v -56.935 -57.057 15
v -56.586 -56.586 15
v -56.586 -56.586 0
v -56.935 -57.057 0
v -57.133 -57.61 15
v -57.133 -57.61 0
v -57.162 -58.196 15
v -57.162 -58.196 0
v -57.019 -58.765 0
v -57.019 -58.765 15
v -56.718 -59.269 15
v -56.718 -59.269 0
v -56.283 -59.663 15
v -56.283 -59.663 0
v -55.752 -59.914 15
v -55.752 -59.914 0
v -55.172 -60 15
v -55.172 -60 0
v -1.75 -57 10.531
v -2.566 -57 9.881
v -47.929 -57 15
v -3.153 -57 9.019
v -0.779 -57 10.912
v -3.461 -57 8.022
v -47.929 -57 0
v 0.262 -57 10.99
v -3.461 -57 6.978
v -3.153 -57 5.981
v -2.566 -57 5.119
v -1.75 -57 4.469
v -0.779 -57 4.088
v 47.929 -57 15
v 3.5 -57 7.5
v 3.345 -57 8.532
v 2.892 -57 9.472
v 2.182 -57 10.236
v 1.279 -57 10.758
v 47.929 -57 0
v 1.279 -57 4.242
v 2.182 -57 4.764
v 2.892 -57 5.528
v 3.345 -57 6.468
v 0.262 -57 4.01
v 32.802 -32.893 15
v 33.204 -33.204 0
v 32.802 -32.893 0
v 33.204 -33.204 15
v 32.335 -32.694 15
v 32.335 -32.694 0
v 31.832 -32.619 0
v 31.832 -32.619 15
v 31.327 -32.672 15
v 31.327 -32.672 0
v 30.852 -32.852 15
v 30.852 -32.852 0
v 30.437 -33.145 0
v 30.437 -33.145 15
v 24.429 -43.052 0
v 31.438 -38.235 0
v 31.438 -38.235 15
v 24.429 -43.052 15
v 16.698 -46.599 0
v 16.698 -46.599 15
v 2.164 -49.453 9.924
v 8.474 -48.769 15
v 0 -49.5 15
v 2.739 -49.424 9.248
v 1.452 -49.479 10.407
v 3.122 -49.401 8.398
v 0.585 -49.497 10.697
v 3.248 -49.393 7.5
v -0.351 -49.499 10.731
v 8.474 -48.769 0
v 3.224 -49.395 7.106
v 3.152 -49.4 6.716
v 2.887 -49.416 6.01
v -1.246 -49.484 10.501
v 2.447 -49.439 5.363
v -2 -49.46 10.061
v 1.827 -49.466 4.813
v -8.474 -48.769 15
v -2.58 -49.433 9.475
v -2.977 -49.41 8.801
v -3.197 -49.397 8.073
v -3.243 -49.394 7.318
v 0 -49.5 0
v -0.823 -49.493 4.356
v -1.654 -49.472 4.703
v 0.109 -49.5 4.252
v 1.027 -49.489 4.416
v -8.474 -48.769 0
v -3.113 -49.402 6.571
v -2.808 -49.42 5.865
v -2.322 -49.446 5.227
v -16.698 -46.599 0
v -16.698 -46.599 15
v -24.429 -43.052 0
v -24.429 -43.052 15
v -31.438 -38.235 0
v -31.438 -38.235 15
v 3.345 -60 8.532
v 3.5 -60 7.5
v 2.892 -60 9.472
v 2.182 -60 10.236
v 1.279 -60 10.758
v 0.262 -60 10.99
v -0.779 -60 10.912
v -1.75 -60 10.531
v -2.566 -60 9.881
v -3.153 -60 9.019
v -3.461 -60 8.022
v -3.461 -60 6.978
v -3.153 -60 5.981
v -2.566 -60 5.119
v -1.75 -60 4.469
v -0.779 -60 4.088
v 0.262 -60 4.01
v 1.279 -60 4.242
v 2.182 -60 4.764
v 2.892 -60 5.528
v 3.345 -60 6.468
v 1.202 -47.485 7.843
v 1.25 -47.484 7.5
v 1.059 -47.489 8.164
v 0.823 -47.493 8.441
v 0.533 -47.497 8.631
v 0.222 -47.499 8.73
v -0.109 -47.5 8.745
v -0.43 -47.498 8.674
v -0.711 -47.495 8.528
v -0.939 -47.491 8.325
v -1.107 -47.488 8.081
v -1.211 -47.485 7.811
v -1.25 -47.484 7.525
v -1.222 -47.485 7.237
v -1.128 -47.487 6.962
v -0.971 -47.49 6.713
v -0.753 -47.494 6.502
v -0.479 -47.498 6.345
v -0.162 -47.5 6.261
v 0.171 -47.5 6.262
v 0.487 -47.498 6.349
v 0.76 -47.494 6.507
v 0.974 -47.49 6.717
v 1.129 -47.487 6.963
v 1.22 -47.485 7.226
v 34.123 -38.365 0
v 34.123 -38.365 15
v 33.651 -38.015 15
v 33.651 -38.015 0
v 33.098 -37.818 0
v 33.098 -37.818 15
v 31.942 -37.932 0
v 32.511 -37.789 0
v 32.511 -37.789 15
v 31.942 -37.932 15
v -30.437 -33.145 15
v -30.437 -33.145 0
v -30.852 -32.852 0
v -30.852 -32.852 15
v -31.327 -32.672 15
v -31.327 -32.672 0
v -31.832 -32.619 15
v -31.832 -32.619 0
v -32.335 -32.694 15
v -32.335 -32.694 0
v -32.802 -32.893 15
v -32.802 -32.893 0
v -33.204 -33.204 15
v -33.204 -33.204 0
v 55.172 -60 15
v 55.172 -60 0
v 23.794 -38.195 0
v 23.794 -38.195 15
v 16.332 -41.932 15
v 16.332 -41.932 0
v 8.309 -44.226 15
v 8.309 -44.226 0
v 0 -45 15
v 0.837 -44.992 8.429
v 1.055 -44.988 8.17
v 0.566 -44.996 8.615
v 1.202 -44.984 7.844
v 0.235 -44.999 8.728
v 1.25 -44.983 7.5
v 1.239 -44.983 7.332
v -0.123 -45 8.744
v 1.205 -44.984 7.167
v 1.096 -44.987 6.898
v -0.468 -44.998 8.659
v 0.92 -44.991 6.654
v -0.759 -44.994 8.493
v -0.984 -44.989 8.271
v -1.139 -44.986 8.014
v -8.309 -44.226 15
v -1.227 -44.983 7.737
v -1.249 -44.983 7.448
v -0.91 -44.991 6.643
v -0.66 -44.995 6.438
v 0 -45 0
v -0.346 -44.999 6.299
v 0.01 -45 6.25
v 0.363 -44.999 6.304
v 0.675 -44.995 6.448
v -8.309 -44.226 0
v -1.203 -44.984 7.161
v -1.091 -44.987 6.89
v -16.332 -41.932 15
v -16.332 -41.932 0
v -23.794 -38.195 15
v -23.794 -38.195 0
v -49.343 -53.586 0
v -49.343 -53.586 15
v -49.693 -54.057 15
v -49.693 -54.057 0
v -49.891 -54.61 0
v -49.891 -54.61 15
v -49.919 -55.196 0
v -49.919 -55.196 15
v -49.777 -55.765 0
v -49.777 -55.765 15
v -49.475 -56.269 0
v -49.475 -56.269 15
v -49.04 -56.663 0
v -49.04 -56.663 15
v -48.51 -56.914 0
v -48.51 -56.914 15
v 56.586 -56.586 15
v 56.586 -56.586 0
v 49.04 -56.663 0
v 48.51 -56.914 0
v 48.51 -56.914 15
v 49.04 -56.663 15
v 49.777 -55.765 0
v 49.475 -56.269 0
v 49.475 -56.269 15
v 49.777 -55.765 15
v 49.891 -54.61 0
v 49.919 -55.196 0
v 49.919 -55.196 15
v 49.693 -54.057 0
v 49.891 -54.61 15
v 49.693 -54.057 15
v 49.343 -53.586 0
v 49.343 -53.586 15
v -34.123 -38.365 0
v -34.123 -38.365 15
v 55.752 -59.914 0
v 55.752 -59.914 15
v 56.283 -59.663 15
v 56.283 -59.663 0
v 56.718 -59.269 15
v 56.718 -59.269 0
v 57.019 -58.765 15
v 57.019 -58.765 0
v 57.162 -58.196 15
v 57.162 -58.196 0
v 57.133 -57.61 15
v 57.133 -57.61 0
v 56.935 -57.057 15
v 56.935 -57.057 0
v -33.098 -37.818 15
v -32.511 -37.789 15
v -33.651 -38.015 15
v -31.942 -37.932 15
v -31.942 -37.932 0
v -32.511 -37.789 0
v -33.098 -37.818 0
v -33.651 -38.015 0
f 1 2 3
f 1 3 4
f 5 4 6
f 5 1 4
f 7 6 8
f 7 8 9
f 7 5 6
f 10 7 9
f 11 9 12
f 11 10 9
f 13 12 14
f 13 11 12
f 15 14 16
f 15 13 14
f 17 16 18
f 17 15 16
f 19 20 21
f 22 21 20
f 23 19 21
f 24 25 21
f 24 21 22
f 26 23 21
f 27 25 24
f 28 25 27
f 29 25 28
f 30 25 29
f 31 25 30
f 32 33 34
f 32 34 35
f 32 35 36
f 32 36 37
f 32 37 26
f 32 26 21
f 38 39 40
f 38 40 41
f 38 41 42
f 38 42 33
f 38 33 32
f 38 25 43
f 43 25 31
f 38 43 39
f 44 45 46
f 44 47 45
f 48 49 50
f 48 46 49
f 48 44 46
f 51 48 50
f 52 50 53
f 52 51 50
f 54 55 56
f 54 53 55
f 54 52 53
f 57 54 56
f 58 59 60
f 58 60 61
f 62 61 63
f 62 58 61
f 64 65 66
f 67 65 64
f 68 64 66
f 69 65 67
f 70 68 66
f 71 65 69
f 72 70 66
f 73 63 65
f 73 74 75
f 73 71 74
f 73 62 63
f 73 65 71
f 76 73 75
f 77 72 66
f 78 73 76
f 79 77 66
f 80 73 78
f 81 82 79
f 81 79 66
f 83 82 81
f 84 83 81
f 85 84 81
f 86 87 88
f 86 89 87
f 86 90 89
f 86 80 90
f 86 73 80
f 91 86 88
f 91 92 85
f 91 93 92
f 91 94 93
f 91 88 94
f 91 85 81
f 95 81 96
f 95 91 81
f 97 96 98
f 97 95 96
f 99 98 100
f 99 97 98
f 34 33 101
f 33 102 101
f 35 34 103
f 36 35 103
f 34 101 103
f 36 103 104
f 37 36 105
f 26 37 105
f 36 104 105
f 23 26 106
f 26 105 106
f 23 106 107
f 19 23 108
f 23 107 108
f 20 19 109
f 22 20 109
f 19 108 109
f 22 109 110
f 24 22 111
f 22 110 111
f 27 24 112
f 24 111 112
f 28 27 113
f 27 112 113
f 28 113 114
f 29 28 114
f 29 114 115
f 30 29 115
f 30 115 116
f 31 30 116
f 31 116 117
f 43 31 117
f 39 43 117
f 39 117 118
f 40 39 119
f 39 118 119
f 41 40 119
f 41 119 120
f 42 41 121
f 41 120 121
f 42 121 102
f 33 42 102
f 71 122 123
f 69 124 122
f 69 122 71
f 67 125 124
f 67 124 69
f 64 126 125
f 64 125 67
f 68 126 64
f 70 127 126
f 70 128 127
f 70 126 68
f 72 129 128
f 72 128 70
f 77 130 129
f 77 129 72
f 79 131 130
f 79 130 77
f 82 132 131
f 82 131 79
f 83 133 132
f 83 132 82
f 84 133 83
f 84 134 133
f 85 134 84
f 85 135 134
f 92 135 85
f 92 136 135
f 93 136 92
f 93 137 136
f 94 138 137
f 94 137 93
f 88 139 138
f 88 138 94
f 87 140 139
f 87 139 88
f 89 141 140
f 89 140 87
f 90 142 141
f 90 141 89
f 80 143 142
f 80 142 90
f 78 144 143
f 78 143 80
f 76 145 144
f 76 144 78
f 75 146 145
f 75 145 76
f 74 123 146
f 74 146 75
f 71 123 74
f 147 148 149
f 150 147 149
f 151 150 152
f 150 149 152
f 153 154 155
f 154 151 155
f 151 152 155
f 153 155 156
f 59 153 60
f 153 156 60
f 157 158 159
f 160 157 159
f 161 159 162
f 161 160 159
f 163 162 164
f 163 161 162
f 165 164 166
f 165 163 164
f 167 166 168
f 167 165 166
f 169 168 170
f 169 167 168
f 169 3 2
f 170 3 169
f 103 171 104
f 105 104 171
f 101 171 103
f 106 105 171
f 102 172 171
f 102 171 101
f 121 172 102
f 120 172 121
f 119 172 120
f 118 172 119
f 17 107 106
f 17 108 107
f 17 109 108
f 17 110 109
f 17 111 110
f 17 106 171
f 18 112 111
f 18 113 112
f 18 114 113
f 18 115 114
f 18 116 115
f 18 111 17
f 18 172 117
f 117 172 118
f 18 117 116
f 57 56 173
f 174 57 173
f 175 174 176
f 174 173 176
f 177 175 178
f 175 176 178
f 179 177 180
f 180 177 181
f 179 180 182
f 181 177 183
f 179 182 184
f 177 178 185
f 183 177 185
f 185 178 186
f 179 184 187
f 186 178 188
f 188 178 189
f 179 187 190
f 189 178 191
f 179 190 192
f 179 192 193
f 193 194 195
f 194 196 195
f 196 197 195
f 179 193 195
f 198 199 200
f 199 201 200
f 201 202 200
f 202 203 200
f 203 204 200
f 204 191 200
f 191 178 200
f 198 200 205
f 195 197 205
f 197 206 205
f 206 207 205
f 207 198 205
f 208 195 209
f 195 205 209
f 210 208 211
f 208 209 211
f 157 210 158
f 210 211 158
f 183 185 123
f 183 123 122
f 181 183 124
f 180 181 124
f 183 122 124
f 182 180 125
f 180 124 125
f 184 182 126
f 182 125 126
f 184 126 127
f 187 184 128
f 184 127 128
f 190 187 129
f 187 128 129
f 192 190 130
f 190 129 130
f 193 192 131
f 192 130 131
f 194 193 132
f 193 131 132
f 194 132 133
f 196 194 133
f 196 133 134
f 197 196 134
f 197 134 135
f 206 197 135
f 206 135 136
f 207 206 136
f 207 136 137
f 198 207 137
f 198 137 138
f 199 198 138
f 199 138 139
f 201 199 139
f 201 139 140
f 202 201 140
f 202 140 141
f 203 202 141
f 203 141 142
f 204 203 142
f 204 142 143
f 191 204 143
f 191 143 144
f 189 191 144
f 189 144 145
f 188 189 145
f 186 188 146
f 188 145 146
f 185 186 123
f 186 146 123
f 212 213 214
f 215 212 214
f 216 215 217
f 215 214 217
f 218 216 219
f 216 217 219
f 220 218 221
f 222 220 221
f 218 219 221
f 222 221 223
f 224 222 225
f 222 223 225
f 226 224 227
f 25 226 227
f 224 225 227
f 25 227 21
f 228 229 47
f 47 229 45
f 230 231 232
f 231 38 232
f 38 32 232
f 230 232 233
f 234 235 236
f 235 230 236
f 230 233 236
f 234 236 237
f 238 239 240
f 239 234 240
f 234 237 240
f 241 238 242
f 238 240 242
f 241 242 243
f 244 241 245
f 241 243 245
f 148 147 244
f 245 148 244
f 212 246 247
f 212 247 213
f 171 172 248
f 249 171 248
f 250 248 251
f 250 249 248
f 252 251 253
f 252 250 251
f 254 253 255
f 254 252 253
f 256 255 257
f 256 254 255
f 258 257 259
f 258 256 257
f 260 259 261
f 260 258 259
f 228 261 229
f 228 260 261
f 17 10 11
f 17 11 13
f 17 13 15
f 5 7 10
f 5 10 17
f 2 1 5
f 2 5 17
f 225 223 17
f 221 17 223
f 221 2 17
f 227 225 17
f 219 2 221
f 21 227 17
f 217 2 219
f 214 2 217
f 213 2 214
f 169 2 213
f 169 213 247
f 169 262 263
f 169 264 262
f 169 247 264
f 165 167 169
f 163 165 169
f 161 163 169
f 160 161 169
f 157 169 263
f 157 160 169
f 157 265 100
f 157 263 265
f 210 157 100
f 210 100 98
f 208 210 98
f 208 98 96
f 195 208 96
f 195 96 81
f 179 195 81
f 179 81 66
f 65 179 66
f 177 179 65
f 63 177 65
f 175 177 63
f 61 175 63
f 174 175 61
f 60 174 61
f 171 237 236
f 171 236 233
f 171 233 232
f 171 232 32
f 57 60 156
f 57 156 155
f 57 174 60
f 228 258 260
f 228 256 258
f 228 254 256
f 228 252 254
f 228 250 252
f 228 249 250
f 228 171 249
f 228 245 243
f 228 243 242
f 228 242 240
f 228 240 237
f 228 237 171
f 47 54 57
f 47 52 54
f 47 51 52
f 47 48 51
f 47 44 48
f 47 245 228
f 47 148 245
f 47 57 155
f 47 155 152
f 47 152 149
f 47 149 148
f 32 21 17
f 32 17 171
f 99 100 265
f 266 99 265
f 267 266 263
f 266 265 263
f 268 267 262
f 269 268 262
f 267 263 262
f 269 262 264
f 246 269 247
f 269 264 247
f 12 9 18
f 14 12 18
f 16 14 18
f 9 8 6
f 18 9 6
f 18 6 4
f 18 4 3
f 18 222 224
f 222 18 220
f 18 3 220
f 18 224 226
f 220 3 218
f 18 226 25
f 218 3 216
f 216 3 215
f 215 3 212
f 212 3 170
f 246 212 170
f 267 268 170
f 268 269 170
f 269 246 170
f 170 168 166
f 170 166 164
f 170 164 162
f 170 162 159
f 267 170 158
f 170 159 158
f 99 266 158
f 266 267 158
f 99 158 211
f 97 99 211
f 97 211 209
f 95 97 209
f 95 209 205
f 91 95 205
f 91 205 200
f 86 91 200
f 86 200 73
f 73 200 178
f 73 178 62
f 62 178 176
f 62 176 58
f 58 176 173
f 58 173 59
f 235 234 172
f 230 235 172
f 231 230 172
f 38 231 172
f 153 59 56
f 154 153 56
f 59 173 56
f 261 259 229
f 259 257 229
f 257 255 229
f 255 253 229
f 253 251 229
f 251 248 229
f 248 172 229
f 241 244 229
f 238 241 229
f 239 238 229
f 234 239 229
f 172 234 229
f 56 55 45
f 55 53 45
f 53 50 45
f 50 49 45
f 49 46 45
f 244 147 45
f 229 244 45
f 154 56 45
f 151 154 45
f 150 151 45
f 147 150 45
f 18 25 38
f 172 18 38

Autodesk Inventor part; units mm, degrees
ref_plane "YZ Plane" through (0, 0, 0) normal (1, 0, 0) x (0, 1, 0)
ref_plane "XZ Plane" through (0, 0, 0) normal (0, 1, 0) x (-1, 0, 0)
ref_plane "XY Plane" through (0, 0, 0) normal (0, 0, 1) x (1, 0, 0)
sketch "Sketch1" plane through (0, 0, 0) normal (0, 0, 1) x (1, 0, 0)
  circle A0 centre (0, 0) radius 45
  line L0 (0, 0) -> (0, -60)
  line L1 (0, -60) -> (60, -60)
  line L2 (60, -60) -> (31.8198, -31.8198)
  line L3 (0, -60) -> (-60, -60)
  line L4 (-60, -60) -> (-31.8198, -31.8198)
  line L5 (29.6985, -33.9411) -> (52.7574, -57)
  line L6 (52.7574, -57) -> (0, -57)
  line L7 (-29.6985, -33.9411) -> (-52.7574, -57)
  line L8 (-52.7574, -57) -> (0, -57)
  circle A1 centre (0, 0) radius 49.5
  point P0 (0, -45)
  point P1 (32.8161, -37.0588)
  point P2 (-32.8161, -37.0588)
  dimension "d0" = 90
  dimension "d1" = 60
  dimension "d2" = 60
  dimension "d3" = 45
  dimension "d18" = 3
  dimension "d19" = 3
  dimension "d20" = 4.5
extrude "Extrusion1" add sketch "Sketch1" along normal blind 15 contours A0 L0 A1 L4 | L2 A1 L0 A0 | A1 L7 L8 L0 L3 L4 | L2 L1 L0 L6 L5 A1
sketch "Sketch6" plane through (-60, -60, 0) normal (0, -1, 0) x (1, 0, 0)
  circle A0 centre (60, 7.5) radius 3.5
  line L0 (0, 15) -> (120, 15) projected
  point P0 (60, 0)
  dimension "d27" = 7
  dimension "d28" = 7.5
extrude "Extrusion6" cut sketch "Sketch6" against normal blind 3
sketch "Sketch7" plane through (-60, -60, 0) normal (0, -1, 0) x (1, 0, 0)
  circle A0 centre (60, 7.5) radius 3.5 projected
  circle A1 centre (60, 7.5) radius 1.25
  point P0 (60, 0)
  dimension "d31" = 2.5
extrude "Extrusion7" cut sketch "Sketch7" against normal blind 21.25 contours A1
chamfer "Chamfer1" distance 2 angle 45 1 edges at (-1.25, -49.4842, 7.5043)
fillet "Fillet1" radius 2 8 edges at (-52.7574, -57, 7.5) (-32.8161, -37.0588, 7.5) (32.8161, -37.0588, 7.5) (52.7574, -57, 7.5) (60, -60, 7.5) (-60, -60, 7.5) (-31.8198, -31.8198, 7.5) (31.8198, -31.8198, 7.5)
properties part number "Horizontal Base_3DPrint"
